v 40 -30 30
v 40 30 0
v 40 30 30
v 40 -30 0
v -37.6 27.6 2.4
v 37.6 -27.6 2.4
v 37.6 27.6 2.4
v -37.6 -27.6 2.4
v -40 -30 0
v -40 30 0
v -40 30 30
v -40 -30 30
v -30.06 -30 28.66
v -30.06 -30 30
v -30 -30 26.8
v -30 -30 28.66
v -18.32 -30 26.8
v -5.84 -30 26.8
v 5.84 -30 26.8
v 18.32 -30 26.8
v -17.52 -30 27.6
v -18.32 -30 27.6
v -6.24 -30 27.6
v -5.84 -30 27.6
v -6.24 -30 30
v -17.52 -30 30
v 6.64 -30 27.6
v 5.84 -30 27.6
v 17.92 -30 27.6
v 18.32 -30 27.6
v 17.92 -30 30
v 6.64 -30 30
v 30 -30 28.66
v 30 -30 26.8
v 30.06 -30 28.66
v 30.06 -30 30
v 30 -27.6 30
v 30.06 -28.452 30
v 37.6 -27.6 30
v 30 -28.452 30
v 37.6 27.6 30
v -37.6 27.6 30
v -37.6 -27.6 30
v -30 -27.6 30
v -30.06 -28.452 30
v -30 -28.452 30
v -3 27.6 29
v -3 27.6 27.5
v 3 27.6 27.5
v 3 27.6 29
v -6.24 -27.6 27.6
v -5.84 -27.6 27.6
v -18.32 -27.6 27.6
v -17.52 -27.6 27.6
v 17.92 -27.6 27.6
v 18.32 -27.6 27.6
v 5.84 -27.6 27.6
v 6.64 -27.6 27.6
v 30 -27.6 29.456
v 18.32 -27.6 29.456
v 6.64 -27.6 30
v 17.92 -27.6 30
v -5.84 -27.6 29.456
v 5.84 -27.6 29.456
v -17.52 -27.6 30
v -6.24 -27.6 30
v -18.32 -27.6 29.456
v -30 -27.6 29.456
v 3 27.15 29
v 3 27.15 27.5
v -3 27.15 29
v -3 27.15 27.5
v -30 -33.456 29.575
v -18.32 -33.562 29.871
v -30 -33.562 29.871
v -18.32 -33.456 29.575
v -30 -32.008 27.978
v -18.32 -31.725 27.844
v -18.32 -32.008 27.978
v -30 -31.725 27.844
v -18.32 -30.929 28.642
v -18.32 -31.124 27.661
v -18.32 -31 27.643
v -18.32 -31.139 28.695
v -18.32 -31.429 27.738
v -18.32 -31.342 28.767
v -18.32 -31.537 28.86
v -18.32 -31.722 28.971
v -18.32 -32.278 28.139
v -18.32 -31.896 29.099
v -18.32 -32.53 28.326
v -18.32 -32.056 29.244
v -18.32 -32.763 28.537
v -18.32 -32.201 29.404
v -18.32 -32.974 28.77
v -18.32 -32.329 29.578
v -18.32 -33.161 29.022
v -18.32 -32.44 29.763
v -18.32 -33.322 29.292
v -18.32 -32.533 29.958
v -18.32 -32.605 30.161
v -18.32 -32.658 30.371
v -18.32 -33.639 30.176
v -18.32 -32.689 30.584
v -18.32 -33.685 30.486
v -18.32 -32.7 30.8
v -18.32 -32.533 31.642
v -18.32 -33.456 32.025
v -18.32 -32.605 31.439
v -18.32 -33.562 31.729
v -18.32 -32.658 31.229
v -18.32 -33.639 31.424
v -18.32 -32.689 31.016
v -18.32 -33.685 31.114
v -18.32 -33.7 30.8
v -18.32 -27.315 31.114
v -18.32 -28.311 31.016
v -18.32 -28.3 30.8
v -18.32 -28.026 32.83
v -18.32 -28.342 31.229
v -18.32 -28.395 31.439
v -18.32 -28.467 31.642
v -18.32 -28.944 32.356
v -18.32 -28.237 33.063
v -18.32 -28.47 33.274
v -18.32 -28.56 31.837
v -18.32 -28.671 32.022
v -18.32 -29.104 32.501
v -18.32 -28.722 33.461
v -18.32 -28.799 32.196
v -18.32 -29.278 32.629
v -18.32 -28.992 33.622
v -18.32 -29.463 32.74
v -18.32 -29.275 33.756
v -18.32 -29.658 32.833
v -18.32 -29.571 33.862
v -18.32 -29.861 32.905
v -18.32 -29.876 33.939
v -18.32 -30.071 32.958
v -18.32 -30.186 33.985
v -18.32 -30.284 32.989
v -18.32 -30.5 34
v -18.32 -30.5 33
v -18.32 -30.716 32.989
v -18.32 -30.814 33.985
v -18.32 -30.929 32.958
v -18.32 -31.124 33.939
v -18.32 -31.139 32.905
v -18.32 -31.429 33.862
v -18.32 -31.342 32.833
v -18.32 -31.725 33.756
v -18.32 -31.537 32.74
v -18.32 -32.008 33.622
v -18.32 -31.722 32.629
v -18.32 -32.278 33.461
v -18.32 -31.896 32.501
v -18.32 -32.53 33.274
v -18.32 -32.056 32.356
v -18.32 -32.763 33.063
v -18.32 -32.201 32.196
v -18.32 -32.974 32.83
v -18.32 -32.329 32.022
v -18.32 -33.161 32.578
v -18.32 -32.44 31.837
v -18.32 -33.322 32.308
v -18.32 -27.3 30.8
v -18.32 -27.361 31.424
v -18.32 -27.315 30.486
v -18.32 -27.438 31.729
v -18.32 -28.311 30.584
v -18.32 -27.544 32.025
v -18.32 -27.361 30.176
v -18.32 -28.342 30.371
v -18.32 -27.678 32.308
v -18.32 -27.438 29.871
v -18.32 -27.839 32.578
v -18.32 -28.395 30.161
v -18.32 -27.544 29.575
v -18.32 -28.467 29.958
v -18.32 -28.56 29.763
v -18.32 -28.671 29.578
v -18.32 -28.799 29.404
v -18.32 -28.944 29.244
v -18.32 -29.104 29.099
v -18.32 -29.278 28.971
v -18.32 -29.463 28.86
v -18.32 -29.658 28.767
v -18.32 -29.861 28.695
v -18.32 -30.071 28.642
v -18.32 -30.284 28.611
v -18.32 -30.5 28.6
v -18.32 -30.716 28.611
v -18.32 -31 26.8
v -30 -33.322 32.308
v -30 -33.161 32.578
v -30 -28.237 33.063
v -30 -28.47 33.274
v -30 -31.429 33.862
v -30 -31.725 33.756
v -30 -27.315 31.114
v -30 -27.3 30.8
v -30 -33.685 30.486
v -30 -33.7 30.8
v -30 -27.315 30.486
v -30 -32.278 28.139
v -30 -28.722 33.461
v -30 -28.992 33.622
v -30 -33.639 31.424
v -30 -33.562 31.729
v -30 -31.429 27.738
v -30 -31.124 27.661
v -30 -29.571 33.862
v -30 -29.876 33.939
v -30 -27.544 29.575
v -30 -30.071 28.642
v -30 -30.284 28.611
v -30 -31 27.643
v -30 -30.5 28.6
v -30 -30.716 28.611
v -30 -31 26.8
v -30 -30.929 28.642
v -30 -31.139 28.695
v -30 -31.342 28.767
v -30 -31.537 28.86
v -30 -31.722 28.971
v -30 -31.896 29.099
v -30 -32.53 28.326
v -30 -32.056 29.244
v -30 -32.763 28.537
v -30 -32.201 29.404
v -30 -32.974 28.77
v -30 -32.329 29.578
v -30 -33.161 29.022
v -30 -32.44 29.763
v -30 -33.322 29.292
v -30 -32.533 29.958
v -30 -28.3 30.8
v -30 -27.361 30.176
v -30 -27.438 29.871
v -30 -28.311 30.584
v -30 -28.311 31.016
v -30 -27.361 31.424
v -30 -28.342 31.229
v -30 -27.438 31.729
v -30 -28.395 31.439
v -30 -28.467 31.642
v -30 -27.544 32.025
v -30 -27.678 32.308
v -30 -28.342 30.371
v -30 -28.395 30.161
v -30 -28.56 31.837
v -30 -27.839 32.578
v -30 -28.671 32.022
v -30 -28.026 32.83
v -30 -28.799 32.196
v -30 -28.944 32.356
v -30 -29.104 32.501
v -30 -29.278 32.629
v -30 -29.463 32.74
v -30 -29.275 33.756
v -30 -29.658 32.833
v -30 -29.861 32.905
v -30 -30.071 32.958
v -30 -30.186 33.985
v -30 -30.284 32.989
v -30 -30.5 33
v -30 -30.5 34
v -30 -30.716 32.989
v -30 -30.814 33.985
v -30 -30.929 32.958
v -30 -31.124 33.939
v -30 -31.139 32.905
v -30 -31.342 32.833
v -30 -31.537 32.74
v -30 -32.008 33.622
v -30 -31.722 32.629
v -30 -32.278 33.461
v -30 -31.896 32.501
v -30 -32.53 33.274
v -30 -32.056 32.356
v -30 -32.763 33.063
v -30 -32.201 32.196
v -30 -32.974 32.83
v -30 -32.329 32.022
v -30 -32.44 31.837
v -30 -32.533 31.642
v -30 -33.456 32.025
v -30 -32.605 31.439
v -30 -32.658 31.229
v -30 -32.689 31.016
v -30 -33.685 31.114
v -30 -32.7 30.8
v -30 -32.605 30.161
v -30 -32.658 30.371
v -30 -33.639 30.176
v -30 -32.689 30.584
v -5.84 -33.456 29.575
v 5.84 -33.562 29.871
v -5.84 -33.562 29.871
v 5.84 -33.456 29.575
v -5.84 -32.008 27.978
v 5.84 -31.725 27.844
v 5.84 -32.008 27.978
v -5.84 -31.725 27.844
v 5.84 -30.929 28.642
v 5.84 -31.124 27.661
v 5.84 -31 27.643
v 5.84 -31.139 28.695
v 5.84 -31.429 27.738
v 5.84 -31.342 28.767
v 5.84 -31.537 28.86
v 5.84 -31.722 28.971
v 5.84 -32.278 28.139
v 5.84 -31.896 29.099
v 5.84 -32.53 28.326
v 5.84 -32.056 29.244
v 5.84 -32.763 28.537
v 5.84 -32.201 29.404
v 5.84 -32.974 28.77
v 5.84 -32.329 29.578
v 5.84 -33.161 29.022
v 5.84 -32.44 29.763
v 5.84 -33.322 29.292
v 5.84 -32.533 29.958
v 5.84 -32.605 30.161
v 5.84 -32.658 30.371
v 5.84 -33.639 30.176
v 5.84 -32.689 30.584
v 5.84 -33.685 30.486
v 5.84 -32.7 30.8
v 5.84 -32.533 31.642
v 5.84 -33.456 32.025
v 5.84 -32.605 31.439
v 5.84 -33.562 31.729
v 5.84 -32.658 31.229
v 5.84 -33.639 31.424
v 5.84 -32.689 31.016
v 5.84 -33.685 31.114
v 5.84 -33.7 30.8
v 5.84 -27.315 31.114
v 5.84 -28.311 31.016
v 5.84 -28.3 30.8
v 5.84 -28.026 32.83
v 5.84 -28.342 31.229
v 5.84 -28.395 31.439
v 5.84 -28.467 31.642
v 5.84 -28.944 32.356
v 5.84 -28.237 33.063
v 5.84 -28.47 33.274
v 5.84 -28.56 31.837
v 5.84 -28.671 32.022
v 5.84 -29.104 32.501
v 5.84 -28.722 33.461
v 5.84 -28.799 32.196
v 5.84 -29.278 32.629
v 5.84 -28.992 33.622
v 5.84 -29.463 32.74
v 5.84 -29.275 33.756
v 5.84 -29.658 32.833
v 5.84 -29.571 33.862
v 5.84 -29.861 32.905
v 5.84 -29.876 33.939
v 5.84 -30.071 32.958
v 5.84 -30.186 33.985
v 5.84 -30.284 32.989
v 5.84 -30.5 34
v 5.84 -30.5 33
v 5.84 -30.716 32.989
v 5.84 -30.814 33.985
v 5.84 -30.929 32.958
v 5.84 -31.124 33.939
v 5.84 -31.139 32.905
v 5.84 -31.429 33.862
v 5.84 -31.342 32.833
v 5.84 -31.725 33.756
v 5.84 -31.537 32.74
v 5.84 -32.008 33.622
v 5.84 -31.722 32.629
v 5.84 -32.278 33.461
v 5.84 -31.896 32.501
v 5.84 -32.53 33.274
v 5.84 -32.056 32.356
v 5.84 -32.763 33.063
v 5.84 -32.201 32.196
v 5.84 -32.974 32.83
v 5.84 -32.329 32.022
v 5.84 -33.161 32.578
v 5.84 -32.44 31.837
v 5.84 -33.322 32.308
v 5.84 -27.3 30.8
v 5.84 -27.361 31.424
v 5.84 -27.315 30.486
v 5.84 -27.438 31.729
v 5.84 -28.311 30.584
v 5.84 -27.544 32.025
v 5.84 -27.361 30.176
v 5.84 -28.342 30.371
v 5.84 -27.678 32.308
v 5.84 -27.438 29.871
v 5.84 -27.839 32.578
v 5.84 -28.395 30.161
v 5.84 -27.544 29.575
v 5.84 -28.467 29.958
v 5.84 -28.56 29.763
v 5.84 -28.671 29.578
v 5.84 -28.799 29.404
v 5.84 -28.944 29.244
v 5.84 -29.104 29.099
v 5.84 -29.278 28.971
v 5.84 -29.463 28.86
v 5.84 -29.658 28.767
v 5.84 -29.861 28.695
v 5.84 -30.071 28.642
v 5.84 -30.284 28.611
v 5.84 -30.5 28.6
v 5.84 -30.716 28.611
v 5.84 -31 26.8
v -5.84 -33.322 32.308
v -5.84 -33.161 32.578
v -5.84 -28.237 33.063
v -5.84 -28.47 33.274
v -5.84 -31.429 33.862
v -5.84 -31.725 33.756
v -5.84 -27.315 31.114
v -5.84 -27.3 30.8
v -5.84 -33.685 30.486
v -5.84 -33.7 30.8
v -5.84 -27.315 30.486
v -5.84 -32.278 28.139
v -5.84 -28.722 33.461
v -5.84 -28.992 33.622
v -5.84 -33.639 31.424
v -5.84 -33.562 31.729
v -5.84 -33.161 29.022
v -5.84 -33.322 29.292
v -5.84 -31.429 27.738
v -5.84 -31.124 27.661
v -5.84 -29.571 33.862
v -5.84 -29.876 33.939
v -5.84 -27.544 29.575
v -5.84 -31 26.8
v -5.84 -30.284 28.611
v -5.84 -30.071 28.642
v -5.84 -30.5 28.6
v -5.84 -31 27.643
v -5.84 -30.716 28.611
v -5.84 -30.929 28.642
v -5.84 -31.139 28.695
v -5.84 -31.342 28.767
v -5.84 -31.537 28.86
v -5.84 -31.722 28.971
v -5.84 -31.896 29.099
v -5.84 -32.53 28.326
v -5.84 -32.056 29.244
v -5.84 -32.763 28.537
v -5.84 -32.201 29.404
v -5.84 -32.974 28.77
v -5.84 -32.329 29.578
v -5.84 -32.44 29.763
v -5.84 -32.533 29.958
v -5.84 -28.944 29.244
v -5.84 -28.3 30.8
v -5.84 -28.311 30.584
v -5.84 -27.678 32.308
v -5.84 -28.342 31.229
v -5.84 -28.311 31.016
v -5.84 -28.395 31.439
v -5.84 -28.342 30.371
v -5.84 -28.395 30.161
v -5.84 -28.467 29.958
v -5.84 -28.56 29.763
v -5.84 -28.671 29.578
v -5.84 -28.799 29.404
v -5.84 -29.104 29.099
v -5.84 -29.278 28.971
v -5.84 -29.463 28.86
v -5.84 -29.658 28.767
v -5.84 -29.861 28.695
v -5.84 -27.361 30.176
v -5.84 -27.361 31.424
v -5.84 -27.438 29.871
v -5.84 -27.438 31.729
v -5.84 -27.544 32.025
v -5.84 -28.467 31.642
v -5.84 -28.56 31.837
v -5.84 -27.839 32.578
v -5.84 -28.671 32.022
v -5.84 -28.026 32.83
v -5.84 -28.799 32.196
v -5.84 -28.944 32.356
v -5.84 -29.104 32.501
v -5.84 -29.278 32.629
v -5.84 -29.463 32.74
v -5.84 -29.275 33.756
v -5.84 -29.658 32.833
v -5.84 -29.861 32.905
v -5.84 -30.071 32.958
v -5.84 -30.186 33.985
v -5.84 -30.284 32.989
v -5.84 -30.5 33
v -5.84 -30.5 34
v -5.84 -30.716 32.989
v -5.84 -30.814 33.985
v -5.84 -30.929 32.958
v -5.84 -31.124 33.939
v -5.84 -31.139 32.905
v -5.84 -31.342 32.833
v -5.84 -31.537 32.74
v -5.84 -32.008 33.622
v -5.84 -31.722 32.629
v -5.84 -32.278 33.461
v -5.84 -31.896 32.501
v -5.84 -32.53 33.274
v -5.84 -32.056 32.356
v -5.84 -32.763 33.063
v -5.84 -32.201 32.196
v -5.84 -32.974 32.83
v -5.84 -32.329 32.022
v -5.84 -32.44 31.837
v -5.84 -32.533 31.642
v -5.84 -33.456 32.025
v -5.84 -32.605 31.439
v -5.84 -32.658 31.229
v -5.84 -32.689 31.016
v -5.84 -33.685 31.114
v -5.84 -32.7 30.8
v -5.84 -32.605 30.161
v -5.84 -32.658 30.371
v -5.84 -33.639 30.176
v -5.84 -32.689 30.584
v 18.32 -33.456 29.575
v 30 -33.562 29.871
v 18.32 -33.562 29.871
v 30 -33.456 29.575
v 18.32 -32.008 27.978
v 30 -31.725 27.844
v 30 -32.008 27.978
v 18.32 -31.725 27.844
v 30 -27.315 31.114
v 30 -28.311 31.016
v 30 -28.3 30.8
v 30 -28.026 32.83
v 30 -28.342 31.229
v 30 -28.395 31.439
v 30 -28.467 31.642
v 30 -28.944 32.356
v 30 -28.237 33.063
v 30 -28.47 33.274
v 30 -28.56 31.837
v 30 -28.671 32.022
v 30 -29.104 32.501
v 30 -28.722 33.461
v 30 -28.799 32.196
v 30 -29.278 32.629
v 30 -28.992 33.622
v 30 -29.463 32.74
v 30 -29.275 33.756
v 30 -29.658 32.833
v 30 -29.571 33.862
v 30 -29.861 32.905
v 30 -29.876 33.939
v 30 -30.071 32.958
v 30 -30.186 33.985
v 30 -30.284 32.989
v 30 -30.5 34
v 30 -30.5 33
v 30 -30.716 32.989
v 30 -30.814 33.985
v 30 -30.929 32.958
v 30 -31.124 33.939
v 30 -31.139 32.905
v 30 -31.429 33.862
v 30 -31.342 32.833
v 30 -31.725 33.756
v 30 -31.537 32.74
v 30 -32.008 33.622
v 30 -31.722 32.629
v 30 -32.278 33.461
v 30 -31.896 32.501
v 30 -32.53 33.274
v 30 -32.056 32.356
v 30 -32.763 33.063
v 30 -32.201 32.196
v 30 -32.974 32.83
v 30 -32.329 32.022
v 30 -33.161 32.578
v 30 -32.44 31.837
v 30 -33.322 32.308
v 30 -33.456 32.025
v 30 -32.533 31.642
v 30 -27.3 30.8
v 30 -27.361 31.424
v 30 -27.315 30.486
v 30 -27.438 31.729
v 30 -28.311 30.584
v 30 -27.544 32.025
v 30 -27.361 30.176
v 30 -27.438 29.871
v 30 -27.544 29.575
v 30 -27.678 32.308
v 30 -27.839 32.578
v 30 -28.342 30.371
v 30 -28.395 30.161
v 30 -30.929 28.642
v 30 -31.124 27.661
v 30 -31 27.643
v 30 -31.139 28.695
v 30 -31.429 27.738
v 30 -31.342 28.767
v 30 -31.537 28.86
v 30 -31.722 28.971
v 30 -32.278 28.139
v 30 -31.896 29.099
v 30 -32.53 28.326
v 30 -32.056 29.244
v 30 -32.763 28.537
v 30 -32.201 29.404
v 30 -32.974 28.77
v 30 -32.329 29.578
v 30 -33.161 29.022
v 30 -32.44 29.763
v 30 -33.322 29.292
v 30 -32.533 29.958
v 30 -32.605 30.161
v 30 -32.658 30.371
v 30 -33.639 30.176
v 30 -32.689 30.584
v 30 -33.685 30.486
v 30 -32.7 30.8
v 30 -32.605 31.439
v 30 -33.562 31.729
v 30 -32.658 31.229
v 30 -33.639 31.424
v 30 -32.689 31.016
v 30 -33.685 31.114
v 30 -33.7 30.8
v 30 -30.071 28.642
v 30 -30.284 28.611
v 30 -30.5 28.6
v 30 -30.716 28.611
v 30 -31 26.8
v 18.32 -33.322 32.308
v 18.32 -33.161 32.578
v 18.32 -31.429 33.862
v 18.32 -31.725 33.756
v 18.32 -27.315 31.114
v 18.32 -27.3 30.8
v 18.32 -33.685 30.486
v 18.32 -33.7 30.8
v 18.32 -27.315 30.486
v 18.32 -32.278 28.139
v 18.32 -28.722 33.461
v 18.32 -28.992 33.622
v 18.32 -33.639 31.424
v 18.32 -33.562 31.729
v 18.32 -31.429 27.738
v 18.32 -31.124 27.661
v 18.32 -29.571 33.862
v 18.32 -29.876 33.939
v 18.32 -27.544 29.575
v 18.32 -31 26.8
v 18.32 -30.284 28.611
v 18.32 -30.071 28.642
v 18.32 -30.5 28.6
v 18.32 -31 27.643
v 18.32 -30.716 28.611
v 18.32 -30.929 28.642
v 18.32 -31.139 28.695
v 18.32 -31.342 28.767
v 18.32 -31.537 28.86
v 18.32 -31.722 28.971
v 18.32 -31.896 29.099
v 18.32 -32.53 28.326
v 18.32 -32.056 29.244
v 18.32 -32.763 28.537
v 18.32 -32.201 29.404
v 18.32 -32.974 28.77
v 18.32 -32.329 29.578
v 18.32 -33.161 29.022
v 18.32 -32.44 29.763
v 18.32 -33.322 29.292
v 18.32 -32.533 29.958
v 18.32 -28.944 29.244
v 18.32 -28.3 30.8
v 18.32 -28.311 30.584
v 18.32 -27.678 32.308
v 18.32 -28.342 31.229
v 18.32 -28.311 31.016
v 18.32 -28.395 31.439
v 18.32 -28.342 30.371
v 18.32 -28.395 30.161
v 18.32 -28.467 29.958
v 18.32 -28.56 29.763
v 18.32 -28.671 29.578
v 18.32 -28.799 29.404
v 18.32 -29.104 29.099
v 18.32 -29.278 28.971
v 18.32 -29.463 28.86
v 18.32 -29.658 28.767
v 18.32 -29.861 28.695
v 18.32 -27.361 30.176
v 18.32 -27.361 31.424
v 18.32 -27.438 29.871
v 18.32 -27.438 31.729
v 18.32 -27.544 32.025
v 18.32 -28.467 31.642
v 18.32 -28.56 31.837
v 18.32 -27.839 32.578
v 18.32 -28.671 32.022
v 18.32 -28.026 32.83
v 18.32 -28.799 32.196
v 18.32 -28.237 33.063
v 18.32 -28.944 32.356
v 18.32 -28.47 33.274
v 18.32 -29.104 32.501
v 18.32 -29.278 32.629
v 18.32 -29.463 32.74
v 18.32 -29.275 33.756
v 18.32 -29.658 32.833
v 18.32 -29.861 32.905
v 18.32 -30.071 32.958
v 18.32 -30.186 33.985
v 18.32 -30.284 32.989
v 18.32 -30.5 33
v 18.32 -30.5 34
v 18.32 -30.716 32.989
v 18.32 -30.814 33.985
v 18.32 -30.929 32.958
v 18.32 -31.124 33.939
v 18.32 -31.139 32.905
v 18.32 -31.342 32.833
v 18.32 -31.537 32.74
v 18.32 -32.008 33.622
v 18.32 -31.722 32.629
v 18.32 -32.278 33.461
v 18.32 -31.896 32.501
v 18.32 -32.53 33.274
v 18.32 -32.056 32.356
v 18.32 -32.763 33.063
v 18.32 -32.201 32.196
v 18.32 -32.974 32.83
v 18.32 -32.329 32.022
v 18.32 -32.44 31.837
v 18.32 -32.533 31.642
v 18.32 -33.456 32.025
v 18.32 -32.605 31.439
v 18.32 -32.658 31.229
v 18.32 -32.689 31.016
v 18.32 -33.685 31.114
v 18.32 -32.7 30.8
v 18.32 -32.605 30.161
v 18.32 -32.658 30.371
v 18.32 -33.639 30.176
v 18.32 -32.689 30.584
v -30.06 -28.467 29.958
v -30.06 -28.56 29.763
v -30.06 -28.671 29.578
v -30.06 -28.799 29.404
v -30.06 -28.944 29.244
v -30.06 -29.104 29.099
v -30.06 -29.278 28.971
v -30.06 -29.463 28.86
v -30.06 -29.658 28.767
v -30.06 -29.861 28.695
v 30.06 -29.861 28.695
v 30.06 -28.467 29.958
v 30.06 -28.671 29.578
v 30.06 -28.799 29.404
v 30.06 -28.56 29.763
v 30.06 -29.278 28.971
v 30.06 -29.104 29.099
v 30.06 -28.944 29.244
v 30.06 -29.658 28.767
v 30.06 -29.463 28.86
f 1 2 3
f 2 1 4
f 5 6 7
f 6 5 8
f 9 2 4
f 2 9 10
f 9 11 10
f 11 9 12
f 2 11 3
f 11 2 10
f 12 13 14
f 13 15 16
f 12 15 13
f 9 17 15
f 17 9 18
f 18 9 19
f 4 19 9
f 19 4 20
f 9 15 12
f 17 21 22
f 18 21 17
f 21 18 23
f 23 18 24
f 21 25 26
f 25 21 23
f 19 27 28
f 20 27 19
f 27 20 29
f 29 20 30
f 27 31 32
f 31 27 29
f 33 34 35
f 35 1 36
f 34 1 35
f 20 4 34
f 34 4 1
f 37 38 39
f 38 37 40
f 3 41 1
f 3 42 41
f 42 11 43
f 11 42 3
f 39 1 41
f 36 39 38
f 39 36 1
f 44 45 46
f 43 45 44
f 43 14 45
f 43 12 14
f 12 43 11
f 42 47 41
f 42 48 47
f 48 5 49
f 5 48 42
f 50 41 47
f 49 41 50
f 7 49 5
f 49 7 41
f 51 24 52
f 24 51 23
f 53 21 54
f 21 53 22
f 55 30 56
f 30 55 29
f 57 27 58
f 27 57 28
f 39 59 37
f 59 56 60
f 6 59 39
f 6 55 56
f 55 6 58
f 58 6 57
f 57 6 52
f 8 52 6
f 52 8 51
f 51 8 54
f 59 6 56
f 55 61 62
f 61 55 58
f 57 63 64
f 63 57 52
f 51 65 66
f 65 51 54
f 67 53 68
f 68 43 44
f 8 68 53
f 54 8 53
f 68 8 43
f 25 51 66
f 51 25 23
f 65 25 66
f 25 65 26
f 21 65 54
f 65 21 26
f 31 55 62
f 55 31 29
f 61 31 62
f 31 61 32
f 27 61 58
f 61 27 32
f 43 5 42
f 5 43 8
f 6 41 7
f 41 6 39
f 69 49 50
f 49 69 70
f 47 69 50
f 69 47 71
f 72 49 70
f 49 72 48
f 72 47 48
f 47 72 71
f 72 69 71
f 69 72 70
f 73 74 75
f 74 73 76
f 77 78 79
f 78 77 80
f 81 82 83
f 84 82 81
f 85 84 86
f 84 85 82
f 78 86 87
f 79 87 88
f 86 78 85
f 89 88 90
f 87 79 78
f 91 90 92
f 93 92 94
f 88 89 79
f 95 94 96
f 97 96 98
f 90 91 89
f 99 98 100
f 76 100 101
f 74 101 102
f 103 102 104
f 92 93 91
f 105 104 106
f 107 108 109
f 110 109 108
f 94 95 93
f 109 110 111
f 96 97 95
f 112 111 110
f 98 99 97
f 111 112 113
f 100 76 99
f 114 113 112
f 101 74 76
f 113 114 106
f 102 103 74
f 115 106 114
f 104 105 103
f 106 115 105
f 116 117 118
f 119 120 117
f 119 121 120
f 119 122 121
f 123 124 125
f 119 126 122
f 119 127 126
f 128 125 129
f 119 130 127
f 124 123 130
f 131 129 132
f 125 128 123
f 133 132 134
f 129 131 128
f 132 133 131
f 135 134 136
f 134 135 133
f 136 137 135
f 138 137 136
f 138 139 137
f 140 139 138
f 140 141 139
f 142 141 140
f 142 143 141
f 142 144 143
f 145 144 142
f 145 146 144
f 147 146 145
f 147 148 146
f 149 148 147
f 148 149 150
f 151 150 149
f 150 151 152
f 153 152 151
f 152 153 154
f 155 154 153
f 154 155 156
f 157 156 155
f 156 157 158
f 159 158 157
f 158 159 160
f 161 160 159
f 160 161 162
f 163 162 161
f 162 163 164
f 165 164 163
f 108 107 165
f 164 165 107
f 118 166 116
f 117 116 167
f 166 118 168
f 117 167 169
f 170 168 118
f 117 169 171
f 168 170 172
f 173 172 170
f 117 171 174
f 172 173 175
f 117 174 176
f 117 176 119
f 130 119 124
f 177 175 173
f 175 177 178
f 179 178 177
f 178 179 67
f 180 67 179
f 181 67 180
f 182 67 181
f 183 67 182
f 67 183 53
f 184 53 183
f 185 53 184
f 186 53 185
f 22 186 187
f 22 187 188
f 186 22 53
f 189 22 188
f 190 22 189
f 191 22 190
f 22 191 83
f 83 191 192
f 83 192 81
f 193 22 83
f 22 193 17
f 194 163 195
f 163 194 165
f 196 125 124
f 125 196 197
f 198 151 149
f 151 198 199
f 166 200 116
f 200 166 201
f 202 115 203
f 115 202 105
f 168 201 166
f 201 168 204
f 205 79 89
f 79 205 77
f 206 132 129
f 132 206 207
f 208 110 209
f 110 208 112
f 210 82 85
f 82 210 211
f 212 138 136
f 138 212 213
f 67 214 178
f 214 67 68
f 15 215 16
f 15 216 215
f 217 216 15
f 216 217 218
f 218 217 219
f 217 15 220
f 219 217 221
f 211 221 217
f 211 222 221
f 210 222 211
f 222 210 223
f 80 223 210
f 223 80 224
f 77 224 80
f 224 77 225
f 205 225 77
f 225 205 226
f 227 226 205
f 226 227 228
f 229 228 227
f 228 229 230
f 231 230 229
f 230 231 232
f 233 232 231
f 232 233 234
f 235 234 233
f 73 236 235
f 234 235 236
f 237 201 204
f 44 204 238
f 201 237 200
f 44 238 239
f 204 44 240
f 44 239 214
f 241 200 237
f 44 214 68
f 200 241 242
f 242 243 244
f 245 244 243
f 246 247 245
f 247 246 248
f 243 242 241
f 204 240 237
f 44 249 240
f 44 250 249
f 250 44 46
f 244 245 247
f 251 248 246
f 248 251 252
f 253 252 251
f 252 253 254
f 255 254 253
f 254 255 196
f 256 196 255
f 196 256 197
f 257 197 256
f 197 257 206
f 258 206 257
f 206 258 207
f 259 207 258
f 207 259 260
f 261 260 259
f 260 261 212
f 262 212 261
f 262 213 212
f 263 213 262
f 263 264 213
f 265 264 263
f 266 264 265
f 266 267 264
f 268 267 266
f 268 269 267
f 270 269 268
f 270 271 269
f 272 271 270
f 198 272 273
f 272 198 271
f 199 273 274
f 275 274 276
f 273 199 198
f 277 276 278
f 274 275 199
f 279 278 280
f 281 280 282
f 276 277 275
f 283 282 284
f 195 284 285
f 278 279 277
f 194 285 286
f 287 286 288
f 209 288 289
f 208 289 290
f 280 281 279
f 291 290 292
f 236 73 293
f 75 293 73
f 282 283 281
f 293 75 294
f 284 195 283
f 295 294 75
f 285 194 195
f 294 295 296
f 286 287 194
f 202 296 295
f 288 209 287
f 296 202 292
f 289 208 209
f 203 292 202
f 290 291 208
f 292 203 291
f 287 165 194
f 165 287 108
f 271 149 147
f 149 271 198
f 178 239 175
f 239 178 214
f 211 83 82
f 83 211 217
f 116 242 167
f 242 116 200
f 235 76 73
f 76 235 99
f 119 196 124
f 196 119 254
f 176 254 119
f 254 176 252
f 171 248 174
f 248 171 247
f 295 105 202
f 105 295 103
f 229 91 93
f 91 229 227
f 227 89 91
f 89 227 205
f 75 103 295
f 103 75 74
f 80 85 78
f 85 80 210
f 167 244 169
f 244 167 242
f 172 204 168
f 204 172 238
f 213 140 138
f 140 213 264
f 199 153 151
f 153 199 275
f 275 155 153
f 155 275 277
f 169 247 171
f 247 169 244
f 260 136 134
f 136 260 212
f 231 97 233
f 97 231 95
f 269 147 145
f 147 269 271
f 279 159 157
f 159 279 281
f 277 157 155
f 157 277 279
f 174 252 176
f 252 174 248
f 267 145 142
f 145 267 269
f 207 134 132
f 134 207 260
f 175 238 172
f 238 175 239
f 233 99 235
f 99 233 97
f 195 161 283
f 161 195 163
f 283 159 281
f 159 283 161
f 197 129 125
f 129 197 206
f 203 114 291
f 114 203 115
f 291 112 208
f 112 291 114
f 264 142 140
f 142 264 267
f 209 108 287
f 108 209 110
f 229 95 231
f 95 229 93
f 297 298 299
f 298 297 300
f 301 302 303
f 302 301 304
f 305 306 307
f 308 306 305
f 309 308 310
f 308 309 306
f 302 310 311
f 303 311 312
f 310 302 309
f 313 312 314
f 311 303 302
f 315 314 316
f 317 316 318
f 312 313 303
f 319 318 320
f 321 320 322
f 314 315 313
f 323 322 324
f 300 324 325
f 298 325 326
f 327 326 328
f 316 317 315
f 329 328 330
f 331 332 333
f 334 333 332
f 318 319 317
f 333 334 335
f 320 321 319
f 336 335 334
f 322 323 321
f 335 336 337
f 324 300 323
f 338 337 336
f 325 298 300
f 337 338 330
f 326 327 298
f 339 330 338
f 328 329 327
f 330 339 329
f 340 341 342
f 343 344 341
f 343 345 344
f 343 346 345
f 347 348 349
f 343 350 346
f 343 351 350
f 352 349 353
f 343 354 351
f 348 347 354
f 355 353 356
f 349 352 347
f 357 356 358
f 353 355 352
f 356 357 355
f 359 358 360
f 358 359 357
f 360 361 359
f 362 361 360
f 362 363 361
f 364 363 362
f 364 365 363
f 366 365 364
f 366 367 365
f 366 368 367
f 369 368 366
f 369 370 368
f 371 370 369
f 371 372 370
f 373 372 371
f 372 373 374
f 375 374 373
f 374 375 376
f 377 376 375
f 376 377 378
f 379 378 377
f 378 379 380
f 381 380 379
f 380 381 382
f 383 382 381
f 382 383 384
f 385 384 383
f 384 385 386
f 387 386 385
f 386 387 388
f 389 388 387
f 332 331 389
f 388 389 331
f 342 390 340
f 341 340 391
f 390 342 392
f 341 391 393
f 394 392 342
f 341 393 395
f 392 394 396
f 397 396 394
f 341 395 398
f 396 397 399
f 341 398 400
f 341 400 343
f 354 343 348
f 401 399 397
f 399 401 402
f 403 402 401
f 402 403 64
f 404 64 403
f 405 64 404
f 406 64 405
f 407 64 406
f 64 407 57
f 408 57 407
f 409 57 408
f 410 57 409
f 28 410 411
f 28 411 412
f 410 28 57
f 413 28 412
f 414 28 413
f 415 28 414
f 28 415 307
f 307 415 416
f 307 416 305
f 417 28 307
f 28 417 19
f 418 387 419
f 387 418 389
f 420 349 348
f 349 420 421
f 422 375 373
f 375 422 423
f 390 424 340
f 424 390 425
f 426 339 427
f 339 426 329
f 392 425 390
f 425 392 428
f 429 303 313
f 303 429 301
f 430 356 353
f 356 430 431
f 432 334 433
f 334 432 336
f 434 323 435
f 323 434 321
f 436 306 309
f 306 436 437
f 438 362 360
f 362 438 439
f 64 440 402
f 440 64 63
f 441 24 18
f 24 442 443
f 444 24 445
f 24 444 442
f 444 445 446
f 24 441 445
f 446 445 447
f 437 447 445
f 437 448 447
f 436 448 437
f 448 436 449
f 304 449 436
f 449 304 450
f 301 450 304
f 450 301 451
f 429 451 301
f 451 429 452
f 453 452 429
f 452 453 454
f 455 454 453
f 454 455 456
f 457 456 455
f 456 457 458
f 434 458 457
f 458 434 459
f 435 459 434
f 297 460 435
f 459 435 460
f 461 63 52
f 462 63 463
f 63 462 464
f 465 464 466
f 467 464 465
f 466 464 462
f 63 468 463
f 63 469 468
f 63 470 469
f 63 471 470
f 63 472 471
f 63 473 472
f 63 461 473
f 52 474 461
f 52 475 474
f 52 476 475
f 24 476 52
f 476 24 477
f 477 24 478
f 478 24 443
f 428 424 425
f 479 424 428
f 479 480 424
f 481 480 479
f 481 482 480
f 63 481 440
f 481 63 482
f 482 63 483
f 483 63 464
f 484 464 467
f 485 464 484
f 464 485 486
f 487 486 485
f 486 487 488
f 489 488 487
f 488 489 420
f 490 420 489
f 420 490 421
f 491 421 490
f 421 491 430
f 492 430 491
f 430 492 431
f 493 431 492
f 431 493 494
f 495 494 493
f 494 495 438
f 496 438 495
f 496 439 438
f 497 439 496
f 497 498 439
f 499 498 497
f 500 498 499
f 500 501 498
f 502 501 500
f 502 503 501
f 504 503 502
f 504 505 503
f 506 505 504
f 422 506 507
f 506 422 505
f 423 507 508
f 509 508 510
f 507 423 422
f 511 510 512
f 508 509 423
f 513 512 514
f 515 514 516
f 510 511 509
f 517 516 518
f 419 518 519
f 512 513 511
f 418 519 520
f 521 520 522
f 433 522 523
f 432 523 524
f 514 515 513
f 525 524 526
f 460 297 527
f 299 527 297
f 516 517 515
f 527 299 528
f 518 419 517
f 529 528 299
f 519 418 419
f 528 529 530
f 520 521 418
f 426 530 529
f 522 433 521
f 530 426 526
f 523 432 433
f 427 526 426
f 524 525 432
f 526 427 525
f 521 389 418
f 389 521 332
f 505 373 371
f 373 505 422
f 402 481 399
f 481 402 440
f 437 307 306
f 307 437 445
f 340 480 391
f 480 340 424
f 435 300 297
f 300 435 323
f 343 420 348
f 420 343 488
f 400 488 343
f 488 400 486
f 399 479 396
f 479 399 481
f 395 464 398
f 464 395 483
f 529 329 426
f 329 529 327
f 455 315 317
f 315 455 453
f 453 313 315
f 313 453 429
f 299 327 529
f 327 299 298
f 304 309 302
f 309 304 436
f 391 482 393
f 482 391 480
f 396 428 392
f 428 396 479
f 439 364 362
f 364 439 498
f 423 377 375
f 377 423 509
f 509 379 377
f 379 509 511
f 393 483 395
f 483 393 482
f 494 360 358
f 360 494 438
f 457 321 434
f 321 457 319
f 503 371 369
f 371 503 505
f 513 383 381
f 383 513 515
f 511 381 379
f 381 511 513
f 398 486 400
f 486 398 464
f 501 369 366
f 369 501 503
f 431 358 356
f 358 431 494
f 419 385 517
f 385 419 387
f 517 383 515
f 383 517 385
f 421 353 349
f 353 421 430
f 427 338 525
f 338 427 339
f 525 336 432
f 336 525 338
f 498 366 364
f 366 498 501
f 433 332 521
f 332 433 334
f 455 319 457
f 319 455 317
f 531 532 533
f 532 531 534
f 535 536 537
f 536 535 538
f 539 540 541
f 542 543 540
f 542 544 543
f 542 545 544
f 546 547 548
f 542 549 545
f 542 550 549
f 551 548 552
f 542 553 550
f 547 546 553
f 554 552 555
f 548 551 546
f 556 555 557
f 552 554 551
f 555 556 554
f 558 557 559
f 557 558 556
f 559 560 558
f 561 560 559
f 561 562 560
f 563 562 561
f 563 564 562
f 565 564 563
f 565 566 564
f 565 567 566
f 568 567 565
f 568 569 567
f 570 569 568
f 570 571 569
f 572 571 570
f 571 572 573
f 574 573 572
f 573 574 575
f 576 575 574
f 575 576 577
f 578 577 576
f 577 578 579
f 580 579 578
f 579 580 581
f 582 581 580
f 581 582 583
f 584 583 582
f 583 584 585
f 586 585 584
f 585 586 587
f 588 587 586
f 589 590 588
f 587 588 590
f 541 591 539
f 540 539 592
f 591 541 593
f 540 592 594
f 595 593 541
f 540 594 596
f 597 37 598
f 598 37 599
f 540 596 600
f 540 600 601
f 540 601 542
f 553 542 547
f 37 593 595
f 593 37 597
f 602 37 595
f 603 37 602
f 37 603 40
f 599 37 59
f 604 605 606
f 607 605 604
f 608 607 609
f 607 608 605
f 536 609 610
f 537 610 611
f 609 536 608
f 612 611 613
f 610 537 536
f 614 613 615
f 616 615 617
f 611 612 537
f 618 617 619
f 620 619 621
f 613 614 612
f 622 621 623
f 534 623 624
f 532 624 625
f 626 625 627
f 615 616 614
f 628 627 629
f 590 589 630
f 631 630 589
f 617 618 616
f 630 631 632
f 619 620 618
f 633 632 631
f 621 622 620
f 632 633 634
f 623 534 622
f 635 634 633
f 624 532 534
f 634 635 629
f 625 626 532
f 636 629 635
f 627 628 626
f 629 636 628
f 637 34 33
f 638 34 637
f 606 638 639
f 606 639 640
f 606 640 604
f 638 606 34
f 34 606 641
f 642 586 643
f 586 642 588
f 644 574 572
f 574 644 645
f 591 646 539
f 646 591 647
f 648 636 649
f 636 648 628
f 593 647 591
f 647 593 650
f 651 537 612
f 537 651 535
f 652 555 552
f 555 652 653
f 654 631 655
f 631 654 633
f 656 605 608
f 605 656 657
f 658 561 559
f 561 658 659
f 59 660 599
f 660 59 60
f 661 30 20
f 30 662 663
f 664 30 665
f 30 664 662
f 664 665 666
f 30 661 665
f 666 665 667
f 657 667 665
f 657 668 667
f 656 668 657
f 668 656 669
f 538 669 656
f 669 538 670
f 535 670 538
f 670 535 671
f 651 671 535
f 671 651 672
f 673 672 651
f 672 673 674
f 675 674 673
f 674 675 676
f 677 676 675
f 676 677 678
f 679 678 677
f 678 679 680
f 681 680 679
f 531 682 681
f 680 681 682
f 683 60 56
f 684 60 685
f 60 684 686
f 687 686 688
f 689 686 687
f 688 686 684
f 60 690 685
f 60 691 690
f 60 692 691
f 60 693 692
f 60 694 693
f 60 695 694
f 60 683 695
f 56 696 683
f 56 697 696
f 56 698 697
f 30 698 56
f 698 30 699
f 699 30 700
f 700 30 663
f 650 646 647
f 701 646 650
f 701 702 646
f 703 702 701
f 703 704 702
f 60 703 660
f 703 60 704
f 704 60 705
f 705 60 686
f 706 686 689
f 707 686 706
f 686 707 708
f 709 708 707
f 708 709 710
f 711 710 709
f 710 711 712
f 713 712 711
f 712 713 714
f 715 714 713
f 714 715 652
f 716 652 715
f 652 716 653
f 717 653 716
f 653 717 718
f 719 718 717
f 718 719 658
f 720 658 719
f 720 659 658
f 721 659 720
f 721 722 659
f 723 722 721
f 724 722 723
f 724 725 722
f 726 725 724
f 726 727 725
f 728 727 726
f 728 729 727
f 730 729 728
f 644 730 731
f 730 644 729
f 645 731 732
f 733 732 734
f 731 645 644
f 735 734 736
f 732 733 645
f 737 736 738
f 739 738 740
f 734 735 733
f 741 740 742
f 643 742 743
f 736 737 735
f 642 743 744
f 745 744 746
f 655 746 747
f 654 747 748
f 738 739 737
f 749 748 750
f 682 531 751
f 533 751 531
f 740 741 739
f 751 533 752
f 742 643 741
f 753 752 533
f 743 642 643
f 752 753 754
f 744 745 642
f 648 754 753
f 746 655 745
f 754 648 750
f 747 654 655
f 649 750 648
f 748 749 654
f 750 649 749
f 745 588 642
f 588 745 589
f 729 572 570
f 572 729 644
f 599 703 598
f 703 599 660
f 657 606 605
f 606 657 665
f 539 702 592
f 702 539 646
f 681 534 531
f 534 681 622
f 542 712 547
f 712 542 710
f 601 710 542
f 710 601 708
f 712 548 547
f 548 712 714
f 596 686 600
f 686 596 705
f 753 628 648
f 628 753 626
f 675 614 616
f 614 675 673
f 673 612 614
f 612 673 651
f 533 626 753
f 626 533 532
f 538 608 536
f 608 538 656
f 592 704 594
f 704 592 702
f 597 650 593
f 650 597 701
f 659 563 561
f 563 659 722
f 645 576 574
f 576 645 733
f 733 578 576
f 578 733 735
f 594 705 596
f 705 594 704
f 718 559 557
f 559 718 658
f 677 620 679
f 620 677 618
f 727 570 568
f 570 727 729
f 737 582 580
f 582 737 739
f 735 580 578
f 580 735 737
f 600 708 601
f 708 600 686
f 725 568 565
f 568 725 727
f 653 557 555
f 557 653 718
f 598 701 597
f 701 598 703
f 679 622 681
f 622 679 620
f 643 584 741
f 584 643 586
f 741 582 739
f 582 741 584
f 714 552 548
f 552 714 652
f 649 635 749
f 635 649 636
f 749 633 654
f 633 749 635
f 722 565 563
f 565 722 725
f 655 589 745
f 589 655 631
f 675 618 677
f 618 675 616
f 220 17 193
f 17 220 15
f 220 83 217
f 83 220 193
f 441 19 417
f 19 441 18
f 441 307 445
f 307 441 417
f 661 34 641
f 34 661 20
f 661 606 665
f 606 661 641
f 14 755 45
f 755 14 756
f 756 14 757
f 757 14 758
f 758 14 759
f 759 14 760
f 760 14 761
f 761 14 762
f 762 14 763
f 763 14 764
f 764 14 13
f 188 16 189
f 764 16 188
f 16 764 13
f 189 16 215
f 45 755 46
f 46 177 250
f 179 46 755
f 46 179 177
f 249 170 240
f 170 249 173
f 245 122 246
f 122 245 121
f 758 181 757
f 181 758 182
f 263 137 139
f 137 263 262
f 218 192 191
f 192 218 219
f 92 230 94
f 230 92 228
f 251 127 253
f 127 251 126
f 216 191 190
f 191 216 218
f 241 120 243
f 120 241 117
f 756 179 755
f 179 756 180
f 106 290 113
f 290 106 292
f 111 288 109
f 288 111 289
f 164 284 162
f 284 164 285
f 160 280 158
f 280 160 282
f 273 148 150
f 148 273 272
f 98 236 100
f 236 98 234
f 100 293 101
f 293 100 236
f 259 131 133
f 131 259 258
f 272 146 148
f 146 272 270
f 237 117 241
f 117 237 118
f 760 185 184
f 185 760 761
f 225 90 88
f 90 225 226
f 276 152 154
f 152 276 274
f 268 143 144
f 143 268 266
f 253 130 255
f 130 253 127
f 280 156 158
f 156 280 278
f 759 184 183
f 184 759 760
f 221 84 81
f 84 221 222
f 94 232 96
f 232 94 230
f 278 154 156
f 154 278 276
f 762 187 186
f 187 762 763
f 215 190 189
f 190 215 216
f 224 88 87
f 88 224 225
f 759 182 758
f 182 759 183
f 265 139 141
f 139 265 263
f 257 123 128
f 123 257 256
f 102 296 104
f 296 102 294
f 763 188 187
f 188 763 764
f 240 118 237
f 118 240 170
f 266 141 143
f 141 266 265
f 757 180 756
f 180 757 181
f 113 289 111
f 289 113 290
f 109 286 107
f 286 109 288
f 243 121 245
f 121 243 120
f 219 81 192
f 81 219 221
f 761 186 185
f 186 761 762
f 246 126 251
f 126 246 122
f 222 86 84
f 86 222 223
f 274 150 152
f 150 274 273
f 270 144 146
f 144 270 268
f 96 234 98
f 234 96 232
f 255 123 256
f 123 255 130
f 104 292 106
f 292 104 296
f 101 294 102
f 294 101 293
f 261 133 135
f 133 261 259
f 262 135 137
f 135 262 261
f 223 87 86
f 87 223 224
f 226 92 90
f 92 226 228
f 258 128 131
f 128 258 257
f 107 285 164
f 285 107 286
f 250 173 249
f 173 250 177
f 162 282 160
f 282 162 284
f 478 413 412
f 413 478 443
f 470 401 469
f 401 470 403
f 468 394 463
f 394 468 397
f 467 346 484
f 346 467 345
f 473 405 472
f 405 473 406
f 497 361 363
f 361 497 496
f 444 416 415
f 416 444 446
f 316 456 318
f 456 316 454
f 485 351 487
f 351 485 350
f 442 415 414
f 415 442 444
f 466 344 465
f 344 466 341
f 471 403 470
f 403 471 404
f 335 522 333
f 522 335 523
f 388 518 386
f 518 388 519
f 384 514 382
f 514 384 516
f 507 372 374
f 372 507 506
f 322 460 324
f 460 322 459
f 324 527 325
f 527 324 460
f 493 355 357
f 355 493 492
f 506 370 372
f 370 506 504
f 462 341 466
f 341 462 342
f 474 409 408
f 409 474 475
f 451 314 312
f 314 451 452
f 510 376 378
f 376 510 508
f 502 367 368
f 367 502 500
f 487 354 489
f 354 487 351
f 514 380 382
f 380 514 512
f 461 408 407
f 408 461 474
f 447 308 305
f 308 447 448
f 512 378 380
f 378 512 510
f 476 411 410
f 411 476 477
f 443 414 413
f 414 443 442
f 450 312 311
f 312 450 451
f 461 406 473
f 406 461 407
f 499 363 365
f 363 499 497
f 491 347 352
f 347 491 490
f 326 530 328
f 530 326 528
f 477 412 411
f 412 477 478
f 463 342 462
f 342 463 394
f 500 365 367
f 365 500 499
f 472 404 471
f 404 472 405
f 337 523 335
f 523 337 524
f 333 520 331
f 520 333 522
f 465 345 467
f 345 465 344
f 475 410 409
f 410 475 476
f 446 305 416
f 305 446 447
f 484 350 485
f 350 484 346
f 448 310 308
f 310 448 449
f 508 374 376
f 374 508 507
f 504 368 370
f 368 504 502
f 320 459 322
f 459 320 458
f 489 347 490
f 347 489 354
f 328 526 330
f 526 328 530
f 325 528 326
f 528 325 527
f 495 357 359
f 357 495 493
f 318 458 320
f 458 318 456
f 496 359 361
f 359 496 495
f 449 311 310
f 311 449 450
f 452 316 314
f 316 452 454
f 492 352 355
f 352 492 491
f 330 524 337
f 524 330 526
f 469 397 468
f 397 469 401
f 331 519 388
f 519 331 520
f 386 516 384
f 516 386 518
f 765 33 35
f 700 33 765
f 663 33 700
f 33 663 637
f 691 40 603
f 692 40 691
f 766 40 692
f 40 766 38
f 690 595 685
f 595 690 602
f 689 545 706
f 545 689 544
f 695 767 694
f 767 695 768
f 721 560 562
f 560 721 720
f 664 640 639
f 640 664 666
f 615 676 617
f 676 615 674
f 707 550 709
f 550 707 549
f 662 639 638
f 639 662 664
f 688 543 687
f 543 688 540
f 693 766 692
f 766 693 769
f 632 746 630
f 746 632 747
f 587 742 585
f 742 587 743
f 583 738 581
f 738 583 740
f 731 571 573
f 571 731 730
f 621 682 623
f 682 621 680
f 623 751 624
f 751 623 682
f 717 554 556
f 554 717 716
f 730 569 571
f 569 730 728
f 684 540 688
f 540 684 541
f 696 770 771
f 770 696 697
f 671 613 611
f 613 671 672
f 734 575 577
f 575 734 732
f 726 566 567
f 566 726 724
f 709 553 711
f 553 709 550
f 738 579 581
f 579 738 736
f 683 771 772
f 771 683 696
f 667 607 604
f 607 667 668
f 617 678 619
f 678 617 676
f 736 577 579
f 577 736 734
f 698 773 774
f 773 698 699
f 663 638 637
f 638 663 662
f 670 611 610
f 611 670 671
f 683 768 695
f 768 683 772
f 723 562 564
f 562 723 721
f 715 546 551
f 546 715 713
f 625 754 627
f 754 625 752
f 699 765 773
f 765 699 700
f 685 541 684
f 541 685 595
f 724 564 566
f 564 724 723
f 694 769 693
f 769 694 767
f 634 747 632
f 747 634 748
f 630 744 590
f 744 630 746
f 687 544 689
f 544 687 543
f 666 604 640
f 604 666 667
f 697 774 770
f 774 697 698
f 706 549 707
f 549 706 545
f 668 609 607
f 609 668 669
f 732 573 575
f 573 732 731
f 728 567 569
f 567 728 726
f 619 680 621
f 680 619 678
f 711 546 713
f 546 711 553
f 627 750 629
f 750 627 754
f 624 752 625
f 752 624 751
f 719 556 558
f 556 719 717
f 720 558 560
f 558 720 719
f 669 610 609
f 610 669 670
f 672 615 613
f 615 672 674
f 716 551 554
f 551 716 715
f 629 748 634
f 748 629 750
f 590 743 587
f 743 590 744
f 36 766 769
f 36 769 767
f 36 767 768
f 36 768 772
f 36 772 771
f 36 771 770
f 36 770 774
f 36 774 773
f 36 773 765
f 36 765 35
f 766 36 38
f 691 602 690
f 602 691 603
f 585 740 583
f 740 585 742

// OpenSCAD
// Box with print-in-place hinge (v4: bridge webs to kill band overhangs)
part = "box"; // [box, lid, pin, assembly]
cadverify_only = "";
module instance(name, part, unit = 1) {
    echo(cadverify_instance = [name, part, unit]);
    if (cadverify_only == "" || cadverify_only == name) children();
}

Rkn = 3.2; rbore = 2.2; rpin = 1.9;
yh = -30.5; zh = 30.8;
lid_zh = 3.4;
lid_lift = 27.4;
pin_lift_z = 27.8; pin_shift_y = -30.5;
k0x0=-30; k0x1=-18.32;
k1x0=-17.92; k1x1=-6.24;
k2x0=-5.84; k2x1=5.84;
k3x0=6.24; k3x1=17.92;
k4x0=18.32; k4x1=30;

$fn = 64;

module xcyl(x0, x1, r, y, z) {
    translate([x0, y, z]) rotate([0, 90, 0]) cylinder(r = r, h = x1 - x0);
}

module box_part() {
    difference() {
        union() {
            translate([-40, -30, 0]) cube([80, 60, 2.4]);
            translate([-40, 27.6, 2.4]) cube([80, 2.4, 27.6]);
            translate([-40, -30, 2.4]) cube([80, 2.4, 27.6 - 2.4]);
            // top band of back wall split into segs clearing lid knuckles axially (0.4 gap each side)
            translate([-40, -30, 27.6]) cube([11.88, 2.4, 2.4]);
            translate([-17.52, -30, 27.6]) cube([11.28, 2.4, 2.4]);
            translate([6.64, -30, 27.6]) cube([11.28, 2.4, 2.4]);
            translate([28.12, -30, 27.6]) cube([11.88, 2.4, 2.4]);
            translate([-40, -27.6, 2.4]) cube([2.4, 55.2, 27.6]);
            translate([37.6, -27.6, 2.4]) cube([2.4, 55.2, 27.6]);
            translate([-3, 27.15, 27.5]) cube([6, 0.45, 1.5]);
            // hinge knuckles + support webs tying them to the back wall
            xcyl(k0x0, k0x1, Rkn, yh, zh);
            xcyl(k2x0, k2x1, Rkn, yh, zh);
            xcyl(k4x0, k4x1, Rkn, yh, zh);
            translate([k0x0, -31, 26.8]) cube([k0x1-k0x0, 3.4, 4.0]);
            translate([k2x0, -31, 26.8]) cube([k2x1-k2x0, 3.4, 4.0]);
            translate([k4x0, -31, 26.8]) cube([k4x1-k4x0, 3.4, 4.0]);
        }
        xcyl(k0x0-0.06, k0x1+0.06, rbore, yh, zh);
        xcyl(k2x0-0.06, k2x1+0.06, rbore, yh, zh);
        xcyl(k4x0-0.06, k4x1+0.06, rbore, yh, zh);
    }
}

module lid_part() {
    difference() {
        union() {
            translate([-40, -30, 10.6]) cube([80, 60, 2.4]);
            translate([-40, 27.6, 3]) cube([80, 2.4, 7.6]);
            translate([-17.92, -30, 3]) cube([11.68, 2.4, 7.6]);
            translate([6.24, -30, 3]) cube([11.68, 2.4, 7.6]);
            translate([-40, -30, 3]) cube([9.6, 2.4, 7.6]);
            translate([-5.44, -30, 3]) cube([10.88, 2.4, 7.6]);
            translate([18.72, -30, 3]) cube([10.88, 2.4, 7.6]);
            translate([30.4, -30, 3]) cube([9.6, 2.4, 7.6]);
            translate([-40, -27.6, 3]) cube([2.4, 55.2, 7.6]);
            translate([37.6, -27.6, 3]) cube([2.4, 55.2, 7.6]);
            translate([-37.2, 25.2, 0]) cube([74.4, 2.0, 10.6]);
            translate([-37.2, -27.2, 0]) cube([74.4, 2.0, 10.6]);
            translate([-37.2, -25.2, 0]) cube([2.0, 50.4, 10.6]);
            translate([35.2, -25.2, 0]) cube([2.0, 50.4, 10.6]);
            xcyl(k1x0, k1x1, Rkn, yh, lid_zh);
            xcyl(k3x0, k3x1, Rkn, yh, lid_zh);
            translate([k1x0, -31, 0]) cube([k1x1-k1x0, 3.4, 5]);
            translate([k3x0, -31, 0]) cube([k3x1-k3x0, 3.4, 5]);
        }
        xcyl(k1x0-0.06, k1x1+0.06, rbore, yh, lid_zh);
        xcyl(k3x0-0.06, k3x1+0.06, rbore, yh, lid_zh);
        translate([-3.25, 26.5, -0.05]) cube([6.5, 1.35, 2.05]);
    }
}

module pin_part() {
    union() {
        xcyl(-32.4, 32.4, rpin, 0, 3);
        xcyl(30.4, 32.4, 3, 0, 3);
        xcyl(-32.4, -30.4, 3, 0, 3);
    }
}

if (part == "box") {
    echo(cadverify_spec = [
        ["bounds", [[-40, -33.7, 0], [40, 30, 34.0]]],
        ["bodies", 1],
        ["through_holes", 3],
        ["support_faces", [["bed", "-z", 4000]]],
        ["overhangs_allowed", [["hinge knuckles, bores and wall cutouts print in place", [[-30.2, -33.9, 26.5], [30.2, -27.1, 33.5]]], ["catch bump underside, tiny 3.6 mm2 ledge", [[-3.2, 26.8, 27.3], [3.2, 27.8, 27.7]]]]],
        ["copies", 1],
        ["details", [
            ["floor", "thickness", [0, 0, -1], [0, 0, 1], 2.4],
            ["front_wall", "thickness", [0, 31, 15], [0, -1, 0], 2.4],
            ["cavity", "void", [[-37.6, -27.6, 2.4], [37.6, 27.6, 29.9]], 0.9],
            ["hinge_bore", "hole", [-31, -30.5, 30.8], [1, 0, 0], [[0, 4.4], [11.6, 4.4]]],
            ["catch_bump", "material", [[-3, 27.15, 27.5], [3, 27.6, 29.0]], 0.9],
            ["hinge_view", "view", [[-30, -34, 26.5], [30, -27, 34.5]]]
        ]]
    ]);
    box_part();
} else if (part == "lid") {
    echo(cadverify_spec = [
        ["bounds", [[-40, -33.7, 0], [40, 30, 13]]],
        ["bodies", 1],
        ["through_holes", 2],
        ["support_faces", [["bed", "-z", 300]]],
        ["overhangs_allowed", [
            ["hinge knuckles and bores print in place", [[-18.2, -33.9, 0], [18.2, -27.1, 4.2]]],
            ["lid top bridging over plug cavity", [[-37.2, -24.9, 10.1], [37.2, 25.2, 11.1]]]
        ]],
        ["copies", 1],
        ["details", [
            ["top", "thickness", [0, 0, 14], [0, 0, -1], 2.4],
            ["skirt", "thickness", [0, 31, 6], [0, -1, 0], 2.4],
            ["plug_cavity", "void", [[-35.2, -24.9, 0], [35.2, 25.2, 10.5]], 0.9],
            ["hinge_bore", "hole", [-18.6, -30.5, 3.4], [1, 0, 0], [[0, 4.4], [11.6, 4.4]]],
            ["catch_notch", "void", [[-3.25, 26.5, 0], [3.25, 27.85, 2.0]], 0.9],
            ["catch_view", "view", [[-5, 26.3, 0], [5, 28.5, 3]]]
        ]]
    ]);
    lid_part();
} else if (part == "pin") {
    echo(cadverify_spec = [
        ["bounds", [[-32.4, -3, 0], [32.4, 3, 6]]],
        ["bodies", 1],
        ["support_faces", []],
        ["overhangs_allowed", [["pin shaft underside bridges with 0.3 gap", [[-32.4, -1.9, 0], [32.4, 1.9, 1.6]]]]],
        ["copies", 1],
        ["details", [
            ["shaft", "thickness", [0, 3, 3], [0, -1, 0], 3.8],
            ["head", "material", [[30.4, -3, 0], [32.4, 3, 6]], 0.7],
            ["pin_view", "view", [[-32.4, -3, 0], [32.4, 3, 6]]]
        ]]
    ]);
    pin_part();
} else if (part == "assembly") {
    echo(cadverify_spec = [
        ["bounds", [[-40, -33.7, 0], [40, 30, 40.4]]],
        ["support_faces", [["bed", "-z", 4000]]],
        ["allowed_interferences", []],
        ["motions", [
            ["lid_open", ["lid"], "rotate", [0, -30.5, 30.8], [1, 0, 0], [0, 110], ["flex", [["lid", "box", 0.5, "catch bump clearance pass"]]]]
        ]],
        ["assembly_order", [
            [["box"], [0, 0, 0]],
            [["lid"], [0, 0, -1]],
            [["pin"], [1, 0, 0]]
        ]],
        ["print_in_place", 0.3],
        ["overhangs_allowed", [
            ["hinge undersides, pin bridge and cutouts in place", [[-33, -34, 26.5], [33, -27, 34.8]]],
            ["lid top bridging over box cavity", [[-37.2, -24.9, 37.5], [37.2, 25.2, 38.5]]],
            ["front lid skirt band over box rim, 0.4 gap flat bridge", [[-40.2, -30.2, 30.2], [40.2, 30.2, 30.6]]],
            ["lid plug bottom face over print gap, flat bridge", [[-37.4, -27.4, 27.2], [37.4, 27.4, 27.6]]],
            ["lid skirt inner ledge over box rim, flat bridge", [[-37.8, -30.2, 37.8], [37.8, 27.8, 38.2]]],
            ["notch top face over notch void, tiny bridge", [[-3.5, 26.3, 29.2], [3.5, 28.0, 29.6]]],
            ["catch bump underside, tiny 3.6 mm2 ledge", [[-3.2, 26.9, 27.3], [3.2, 27.8, 27.7]]]
        ]]
    ]);
    instance("box", "box") box_part();
    instance("lid", "lid") translate([0, 0, lid_lift]) lid_part();
    instance("pin", "pin") translate([0, pin_shift_y, pin_lift_z]) pin_part();
}
